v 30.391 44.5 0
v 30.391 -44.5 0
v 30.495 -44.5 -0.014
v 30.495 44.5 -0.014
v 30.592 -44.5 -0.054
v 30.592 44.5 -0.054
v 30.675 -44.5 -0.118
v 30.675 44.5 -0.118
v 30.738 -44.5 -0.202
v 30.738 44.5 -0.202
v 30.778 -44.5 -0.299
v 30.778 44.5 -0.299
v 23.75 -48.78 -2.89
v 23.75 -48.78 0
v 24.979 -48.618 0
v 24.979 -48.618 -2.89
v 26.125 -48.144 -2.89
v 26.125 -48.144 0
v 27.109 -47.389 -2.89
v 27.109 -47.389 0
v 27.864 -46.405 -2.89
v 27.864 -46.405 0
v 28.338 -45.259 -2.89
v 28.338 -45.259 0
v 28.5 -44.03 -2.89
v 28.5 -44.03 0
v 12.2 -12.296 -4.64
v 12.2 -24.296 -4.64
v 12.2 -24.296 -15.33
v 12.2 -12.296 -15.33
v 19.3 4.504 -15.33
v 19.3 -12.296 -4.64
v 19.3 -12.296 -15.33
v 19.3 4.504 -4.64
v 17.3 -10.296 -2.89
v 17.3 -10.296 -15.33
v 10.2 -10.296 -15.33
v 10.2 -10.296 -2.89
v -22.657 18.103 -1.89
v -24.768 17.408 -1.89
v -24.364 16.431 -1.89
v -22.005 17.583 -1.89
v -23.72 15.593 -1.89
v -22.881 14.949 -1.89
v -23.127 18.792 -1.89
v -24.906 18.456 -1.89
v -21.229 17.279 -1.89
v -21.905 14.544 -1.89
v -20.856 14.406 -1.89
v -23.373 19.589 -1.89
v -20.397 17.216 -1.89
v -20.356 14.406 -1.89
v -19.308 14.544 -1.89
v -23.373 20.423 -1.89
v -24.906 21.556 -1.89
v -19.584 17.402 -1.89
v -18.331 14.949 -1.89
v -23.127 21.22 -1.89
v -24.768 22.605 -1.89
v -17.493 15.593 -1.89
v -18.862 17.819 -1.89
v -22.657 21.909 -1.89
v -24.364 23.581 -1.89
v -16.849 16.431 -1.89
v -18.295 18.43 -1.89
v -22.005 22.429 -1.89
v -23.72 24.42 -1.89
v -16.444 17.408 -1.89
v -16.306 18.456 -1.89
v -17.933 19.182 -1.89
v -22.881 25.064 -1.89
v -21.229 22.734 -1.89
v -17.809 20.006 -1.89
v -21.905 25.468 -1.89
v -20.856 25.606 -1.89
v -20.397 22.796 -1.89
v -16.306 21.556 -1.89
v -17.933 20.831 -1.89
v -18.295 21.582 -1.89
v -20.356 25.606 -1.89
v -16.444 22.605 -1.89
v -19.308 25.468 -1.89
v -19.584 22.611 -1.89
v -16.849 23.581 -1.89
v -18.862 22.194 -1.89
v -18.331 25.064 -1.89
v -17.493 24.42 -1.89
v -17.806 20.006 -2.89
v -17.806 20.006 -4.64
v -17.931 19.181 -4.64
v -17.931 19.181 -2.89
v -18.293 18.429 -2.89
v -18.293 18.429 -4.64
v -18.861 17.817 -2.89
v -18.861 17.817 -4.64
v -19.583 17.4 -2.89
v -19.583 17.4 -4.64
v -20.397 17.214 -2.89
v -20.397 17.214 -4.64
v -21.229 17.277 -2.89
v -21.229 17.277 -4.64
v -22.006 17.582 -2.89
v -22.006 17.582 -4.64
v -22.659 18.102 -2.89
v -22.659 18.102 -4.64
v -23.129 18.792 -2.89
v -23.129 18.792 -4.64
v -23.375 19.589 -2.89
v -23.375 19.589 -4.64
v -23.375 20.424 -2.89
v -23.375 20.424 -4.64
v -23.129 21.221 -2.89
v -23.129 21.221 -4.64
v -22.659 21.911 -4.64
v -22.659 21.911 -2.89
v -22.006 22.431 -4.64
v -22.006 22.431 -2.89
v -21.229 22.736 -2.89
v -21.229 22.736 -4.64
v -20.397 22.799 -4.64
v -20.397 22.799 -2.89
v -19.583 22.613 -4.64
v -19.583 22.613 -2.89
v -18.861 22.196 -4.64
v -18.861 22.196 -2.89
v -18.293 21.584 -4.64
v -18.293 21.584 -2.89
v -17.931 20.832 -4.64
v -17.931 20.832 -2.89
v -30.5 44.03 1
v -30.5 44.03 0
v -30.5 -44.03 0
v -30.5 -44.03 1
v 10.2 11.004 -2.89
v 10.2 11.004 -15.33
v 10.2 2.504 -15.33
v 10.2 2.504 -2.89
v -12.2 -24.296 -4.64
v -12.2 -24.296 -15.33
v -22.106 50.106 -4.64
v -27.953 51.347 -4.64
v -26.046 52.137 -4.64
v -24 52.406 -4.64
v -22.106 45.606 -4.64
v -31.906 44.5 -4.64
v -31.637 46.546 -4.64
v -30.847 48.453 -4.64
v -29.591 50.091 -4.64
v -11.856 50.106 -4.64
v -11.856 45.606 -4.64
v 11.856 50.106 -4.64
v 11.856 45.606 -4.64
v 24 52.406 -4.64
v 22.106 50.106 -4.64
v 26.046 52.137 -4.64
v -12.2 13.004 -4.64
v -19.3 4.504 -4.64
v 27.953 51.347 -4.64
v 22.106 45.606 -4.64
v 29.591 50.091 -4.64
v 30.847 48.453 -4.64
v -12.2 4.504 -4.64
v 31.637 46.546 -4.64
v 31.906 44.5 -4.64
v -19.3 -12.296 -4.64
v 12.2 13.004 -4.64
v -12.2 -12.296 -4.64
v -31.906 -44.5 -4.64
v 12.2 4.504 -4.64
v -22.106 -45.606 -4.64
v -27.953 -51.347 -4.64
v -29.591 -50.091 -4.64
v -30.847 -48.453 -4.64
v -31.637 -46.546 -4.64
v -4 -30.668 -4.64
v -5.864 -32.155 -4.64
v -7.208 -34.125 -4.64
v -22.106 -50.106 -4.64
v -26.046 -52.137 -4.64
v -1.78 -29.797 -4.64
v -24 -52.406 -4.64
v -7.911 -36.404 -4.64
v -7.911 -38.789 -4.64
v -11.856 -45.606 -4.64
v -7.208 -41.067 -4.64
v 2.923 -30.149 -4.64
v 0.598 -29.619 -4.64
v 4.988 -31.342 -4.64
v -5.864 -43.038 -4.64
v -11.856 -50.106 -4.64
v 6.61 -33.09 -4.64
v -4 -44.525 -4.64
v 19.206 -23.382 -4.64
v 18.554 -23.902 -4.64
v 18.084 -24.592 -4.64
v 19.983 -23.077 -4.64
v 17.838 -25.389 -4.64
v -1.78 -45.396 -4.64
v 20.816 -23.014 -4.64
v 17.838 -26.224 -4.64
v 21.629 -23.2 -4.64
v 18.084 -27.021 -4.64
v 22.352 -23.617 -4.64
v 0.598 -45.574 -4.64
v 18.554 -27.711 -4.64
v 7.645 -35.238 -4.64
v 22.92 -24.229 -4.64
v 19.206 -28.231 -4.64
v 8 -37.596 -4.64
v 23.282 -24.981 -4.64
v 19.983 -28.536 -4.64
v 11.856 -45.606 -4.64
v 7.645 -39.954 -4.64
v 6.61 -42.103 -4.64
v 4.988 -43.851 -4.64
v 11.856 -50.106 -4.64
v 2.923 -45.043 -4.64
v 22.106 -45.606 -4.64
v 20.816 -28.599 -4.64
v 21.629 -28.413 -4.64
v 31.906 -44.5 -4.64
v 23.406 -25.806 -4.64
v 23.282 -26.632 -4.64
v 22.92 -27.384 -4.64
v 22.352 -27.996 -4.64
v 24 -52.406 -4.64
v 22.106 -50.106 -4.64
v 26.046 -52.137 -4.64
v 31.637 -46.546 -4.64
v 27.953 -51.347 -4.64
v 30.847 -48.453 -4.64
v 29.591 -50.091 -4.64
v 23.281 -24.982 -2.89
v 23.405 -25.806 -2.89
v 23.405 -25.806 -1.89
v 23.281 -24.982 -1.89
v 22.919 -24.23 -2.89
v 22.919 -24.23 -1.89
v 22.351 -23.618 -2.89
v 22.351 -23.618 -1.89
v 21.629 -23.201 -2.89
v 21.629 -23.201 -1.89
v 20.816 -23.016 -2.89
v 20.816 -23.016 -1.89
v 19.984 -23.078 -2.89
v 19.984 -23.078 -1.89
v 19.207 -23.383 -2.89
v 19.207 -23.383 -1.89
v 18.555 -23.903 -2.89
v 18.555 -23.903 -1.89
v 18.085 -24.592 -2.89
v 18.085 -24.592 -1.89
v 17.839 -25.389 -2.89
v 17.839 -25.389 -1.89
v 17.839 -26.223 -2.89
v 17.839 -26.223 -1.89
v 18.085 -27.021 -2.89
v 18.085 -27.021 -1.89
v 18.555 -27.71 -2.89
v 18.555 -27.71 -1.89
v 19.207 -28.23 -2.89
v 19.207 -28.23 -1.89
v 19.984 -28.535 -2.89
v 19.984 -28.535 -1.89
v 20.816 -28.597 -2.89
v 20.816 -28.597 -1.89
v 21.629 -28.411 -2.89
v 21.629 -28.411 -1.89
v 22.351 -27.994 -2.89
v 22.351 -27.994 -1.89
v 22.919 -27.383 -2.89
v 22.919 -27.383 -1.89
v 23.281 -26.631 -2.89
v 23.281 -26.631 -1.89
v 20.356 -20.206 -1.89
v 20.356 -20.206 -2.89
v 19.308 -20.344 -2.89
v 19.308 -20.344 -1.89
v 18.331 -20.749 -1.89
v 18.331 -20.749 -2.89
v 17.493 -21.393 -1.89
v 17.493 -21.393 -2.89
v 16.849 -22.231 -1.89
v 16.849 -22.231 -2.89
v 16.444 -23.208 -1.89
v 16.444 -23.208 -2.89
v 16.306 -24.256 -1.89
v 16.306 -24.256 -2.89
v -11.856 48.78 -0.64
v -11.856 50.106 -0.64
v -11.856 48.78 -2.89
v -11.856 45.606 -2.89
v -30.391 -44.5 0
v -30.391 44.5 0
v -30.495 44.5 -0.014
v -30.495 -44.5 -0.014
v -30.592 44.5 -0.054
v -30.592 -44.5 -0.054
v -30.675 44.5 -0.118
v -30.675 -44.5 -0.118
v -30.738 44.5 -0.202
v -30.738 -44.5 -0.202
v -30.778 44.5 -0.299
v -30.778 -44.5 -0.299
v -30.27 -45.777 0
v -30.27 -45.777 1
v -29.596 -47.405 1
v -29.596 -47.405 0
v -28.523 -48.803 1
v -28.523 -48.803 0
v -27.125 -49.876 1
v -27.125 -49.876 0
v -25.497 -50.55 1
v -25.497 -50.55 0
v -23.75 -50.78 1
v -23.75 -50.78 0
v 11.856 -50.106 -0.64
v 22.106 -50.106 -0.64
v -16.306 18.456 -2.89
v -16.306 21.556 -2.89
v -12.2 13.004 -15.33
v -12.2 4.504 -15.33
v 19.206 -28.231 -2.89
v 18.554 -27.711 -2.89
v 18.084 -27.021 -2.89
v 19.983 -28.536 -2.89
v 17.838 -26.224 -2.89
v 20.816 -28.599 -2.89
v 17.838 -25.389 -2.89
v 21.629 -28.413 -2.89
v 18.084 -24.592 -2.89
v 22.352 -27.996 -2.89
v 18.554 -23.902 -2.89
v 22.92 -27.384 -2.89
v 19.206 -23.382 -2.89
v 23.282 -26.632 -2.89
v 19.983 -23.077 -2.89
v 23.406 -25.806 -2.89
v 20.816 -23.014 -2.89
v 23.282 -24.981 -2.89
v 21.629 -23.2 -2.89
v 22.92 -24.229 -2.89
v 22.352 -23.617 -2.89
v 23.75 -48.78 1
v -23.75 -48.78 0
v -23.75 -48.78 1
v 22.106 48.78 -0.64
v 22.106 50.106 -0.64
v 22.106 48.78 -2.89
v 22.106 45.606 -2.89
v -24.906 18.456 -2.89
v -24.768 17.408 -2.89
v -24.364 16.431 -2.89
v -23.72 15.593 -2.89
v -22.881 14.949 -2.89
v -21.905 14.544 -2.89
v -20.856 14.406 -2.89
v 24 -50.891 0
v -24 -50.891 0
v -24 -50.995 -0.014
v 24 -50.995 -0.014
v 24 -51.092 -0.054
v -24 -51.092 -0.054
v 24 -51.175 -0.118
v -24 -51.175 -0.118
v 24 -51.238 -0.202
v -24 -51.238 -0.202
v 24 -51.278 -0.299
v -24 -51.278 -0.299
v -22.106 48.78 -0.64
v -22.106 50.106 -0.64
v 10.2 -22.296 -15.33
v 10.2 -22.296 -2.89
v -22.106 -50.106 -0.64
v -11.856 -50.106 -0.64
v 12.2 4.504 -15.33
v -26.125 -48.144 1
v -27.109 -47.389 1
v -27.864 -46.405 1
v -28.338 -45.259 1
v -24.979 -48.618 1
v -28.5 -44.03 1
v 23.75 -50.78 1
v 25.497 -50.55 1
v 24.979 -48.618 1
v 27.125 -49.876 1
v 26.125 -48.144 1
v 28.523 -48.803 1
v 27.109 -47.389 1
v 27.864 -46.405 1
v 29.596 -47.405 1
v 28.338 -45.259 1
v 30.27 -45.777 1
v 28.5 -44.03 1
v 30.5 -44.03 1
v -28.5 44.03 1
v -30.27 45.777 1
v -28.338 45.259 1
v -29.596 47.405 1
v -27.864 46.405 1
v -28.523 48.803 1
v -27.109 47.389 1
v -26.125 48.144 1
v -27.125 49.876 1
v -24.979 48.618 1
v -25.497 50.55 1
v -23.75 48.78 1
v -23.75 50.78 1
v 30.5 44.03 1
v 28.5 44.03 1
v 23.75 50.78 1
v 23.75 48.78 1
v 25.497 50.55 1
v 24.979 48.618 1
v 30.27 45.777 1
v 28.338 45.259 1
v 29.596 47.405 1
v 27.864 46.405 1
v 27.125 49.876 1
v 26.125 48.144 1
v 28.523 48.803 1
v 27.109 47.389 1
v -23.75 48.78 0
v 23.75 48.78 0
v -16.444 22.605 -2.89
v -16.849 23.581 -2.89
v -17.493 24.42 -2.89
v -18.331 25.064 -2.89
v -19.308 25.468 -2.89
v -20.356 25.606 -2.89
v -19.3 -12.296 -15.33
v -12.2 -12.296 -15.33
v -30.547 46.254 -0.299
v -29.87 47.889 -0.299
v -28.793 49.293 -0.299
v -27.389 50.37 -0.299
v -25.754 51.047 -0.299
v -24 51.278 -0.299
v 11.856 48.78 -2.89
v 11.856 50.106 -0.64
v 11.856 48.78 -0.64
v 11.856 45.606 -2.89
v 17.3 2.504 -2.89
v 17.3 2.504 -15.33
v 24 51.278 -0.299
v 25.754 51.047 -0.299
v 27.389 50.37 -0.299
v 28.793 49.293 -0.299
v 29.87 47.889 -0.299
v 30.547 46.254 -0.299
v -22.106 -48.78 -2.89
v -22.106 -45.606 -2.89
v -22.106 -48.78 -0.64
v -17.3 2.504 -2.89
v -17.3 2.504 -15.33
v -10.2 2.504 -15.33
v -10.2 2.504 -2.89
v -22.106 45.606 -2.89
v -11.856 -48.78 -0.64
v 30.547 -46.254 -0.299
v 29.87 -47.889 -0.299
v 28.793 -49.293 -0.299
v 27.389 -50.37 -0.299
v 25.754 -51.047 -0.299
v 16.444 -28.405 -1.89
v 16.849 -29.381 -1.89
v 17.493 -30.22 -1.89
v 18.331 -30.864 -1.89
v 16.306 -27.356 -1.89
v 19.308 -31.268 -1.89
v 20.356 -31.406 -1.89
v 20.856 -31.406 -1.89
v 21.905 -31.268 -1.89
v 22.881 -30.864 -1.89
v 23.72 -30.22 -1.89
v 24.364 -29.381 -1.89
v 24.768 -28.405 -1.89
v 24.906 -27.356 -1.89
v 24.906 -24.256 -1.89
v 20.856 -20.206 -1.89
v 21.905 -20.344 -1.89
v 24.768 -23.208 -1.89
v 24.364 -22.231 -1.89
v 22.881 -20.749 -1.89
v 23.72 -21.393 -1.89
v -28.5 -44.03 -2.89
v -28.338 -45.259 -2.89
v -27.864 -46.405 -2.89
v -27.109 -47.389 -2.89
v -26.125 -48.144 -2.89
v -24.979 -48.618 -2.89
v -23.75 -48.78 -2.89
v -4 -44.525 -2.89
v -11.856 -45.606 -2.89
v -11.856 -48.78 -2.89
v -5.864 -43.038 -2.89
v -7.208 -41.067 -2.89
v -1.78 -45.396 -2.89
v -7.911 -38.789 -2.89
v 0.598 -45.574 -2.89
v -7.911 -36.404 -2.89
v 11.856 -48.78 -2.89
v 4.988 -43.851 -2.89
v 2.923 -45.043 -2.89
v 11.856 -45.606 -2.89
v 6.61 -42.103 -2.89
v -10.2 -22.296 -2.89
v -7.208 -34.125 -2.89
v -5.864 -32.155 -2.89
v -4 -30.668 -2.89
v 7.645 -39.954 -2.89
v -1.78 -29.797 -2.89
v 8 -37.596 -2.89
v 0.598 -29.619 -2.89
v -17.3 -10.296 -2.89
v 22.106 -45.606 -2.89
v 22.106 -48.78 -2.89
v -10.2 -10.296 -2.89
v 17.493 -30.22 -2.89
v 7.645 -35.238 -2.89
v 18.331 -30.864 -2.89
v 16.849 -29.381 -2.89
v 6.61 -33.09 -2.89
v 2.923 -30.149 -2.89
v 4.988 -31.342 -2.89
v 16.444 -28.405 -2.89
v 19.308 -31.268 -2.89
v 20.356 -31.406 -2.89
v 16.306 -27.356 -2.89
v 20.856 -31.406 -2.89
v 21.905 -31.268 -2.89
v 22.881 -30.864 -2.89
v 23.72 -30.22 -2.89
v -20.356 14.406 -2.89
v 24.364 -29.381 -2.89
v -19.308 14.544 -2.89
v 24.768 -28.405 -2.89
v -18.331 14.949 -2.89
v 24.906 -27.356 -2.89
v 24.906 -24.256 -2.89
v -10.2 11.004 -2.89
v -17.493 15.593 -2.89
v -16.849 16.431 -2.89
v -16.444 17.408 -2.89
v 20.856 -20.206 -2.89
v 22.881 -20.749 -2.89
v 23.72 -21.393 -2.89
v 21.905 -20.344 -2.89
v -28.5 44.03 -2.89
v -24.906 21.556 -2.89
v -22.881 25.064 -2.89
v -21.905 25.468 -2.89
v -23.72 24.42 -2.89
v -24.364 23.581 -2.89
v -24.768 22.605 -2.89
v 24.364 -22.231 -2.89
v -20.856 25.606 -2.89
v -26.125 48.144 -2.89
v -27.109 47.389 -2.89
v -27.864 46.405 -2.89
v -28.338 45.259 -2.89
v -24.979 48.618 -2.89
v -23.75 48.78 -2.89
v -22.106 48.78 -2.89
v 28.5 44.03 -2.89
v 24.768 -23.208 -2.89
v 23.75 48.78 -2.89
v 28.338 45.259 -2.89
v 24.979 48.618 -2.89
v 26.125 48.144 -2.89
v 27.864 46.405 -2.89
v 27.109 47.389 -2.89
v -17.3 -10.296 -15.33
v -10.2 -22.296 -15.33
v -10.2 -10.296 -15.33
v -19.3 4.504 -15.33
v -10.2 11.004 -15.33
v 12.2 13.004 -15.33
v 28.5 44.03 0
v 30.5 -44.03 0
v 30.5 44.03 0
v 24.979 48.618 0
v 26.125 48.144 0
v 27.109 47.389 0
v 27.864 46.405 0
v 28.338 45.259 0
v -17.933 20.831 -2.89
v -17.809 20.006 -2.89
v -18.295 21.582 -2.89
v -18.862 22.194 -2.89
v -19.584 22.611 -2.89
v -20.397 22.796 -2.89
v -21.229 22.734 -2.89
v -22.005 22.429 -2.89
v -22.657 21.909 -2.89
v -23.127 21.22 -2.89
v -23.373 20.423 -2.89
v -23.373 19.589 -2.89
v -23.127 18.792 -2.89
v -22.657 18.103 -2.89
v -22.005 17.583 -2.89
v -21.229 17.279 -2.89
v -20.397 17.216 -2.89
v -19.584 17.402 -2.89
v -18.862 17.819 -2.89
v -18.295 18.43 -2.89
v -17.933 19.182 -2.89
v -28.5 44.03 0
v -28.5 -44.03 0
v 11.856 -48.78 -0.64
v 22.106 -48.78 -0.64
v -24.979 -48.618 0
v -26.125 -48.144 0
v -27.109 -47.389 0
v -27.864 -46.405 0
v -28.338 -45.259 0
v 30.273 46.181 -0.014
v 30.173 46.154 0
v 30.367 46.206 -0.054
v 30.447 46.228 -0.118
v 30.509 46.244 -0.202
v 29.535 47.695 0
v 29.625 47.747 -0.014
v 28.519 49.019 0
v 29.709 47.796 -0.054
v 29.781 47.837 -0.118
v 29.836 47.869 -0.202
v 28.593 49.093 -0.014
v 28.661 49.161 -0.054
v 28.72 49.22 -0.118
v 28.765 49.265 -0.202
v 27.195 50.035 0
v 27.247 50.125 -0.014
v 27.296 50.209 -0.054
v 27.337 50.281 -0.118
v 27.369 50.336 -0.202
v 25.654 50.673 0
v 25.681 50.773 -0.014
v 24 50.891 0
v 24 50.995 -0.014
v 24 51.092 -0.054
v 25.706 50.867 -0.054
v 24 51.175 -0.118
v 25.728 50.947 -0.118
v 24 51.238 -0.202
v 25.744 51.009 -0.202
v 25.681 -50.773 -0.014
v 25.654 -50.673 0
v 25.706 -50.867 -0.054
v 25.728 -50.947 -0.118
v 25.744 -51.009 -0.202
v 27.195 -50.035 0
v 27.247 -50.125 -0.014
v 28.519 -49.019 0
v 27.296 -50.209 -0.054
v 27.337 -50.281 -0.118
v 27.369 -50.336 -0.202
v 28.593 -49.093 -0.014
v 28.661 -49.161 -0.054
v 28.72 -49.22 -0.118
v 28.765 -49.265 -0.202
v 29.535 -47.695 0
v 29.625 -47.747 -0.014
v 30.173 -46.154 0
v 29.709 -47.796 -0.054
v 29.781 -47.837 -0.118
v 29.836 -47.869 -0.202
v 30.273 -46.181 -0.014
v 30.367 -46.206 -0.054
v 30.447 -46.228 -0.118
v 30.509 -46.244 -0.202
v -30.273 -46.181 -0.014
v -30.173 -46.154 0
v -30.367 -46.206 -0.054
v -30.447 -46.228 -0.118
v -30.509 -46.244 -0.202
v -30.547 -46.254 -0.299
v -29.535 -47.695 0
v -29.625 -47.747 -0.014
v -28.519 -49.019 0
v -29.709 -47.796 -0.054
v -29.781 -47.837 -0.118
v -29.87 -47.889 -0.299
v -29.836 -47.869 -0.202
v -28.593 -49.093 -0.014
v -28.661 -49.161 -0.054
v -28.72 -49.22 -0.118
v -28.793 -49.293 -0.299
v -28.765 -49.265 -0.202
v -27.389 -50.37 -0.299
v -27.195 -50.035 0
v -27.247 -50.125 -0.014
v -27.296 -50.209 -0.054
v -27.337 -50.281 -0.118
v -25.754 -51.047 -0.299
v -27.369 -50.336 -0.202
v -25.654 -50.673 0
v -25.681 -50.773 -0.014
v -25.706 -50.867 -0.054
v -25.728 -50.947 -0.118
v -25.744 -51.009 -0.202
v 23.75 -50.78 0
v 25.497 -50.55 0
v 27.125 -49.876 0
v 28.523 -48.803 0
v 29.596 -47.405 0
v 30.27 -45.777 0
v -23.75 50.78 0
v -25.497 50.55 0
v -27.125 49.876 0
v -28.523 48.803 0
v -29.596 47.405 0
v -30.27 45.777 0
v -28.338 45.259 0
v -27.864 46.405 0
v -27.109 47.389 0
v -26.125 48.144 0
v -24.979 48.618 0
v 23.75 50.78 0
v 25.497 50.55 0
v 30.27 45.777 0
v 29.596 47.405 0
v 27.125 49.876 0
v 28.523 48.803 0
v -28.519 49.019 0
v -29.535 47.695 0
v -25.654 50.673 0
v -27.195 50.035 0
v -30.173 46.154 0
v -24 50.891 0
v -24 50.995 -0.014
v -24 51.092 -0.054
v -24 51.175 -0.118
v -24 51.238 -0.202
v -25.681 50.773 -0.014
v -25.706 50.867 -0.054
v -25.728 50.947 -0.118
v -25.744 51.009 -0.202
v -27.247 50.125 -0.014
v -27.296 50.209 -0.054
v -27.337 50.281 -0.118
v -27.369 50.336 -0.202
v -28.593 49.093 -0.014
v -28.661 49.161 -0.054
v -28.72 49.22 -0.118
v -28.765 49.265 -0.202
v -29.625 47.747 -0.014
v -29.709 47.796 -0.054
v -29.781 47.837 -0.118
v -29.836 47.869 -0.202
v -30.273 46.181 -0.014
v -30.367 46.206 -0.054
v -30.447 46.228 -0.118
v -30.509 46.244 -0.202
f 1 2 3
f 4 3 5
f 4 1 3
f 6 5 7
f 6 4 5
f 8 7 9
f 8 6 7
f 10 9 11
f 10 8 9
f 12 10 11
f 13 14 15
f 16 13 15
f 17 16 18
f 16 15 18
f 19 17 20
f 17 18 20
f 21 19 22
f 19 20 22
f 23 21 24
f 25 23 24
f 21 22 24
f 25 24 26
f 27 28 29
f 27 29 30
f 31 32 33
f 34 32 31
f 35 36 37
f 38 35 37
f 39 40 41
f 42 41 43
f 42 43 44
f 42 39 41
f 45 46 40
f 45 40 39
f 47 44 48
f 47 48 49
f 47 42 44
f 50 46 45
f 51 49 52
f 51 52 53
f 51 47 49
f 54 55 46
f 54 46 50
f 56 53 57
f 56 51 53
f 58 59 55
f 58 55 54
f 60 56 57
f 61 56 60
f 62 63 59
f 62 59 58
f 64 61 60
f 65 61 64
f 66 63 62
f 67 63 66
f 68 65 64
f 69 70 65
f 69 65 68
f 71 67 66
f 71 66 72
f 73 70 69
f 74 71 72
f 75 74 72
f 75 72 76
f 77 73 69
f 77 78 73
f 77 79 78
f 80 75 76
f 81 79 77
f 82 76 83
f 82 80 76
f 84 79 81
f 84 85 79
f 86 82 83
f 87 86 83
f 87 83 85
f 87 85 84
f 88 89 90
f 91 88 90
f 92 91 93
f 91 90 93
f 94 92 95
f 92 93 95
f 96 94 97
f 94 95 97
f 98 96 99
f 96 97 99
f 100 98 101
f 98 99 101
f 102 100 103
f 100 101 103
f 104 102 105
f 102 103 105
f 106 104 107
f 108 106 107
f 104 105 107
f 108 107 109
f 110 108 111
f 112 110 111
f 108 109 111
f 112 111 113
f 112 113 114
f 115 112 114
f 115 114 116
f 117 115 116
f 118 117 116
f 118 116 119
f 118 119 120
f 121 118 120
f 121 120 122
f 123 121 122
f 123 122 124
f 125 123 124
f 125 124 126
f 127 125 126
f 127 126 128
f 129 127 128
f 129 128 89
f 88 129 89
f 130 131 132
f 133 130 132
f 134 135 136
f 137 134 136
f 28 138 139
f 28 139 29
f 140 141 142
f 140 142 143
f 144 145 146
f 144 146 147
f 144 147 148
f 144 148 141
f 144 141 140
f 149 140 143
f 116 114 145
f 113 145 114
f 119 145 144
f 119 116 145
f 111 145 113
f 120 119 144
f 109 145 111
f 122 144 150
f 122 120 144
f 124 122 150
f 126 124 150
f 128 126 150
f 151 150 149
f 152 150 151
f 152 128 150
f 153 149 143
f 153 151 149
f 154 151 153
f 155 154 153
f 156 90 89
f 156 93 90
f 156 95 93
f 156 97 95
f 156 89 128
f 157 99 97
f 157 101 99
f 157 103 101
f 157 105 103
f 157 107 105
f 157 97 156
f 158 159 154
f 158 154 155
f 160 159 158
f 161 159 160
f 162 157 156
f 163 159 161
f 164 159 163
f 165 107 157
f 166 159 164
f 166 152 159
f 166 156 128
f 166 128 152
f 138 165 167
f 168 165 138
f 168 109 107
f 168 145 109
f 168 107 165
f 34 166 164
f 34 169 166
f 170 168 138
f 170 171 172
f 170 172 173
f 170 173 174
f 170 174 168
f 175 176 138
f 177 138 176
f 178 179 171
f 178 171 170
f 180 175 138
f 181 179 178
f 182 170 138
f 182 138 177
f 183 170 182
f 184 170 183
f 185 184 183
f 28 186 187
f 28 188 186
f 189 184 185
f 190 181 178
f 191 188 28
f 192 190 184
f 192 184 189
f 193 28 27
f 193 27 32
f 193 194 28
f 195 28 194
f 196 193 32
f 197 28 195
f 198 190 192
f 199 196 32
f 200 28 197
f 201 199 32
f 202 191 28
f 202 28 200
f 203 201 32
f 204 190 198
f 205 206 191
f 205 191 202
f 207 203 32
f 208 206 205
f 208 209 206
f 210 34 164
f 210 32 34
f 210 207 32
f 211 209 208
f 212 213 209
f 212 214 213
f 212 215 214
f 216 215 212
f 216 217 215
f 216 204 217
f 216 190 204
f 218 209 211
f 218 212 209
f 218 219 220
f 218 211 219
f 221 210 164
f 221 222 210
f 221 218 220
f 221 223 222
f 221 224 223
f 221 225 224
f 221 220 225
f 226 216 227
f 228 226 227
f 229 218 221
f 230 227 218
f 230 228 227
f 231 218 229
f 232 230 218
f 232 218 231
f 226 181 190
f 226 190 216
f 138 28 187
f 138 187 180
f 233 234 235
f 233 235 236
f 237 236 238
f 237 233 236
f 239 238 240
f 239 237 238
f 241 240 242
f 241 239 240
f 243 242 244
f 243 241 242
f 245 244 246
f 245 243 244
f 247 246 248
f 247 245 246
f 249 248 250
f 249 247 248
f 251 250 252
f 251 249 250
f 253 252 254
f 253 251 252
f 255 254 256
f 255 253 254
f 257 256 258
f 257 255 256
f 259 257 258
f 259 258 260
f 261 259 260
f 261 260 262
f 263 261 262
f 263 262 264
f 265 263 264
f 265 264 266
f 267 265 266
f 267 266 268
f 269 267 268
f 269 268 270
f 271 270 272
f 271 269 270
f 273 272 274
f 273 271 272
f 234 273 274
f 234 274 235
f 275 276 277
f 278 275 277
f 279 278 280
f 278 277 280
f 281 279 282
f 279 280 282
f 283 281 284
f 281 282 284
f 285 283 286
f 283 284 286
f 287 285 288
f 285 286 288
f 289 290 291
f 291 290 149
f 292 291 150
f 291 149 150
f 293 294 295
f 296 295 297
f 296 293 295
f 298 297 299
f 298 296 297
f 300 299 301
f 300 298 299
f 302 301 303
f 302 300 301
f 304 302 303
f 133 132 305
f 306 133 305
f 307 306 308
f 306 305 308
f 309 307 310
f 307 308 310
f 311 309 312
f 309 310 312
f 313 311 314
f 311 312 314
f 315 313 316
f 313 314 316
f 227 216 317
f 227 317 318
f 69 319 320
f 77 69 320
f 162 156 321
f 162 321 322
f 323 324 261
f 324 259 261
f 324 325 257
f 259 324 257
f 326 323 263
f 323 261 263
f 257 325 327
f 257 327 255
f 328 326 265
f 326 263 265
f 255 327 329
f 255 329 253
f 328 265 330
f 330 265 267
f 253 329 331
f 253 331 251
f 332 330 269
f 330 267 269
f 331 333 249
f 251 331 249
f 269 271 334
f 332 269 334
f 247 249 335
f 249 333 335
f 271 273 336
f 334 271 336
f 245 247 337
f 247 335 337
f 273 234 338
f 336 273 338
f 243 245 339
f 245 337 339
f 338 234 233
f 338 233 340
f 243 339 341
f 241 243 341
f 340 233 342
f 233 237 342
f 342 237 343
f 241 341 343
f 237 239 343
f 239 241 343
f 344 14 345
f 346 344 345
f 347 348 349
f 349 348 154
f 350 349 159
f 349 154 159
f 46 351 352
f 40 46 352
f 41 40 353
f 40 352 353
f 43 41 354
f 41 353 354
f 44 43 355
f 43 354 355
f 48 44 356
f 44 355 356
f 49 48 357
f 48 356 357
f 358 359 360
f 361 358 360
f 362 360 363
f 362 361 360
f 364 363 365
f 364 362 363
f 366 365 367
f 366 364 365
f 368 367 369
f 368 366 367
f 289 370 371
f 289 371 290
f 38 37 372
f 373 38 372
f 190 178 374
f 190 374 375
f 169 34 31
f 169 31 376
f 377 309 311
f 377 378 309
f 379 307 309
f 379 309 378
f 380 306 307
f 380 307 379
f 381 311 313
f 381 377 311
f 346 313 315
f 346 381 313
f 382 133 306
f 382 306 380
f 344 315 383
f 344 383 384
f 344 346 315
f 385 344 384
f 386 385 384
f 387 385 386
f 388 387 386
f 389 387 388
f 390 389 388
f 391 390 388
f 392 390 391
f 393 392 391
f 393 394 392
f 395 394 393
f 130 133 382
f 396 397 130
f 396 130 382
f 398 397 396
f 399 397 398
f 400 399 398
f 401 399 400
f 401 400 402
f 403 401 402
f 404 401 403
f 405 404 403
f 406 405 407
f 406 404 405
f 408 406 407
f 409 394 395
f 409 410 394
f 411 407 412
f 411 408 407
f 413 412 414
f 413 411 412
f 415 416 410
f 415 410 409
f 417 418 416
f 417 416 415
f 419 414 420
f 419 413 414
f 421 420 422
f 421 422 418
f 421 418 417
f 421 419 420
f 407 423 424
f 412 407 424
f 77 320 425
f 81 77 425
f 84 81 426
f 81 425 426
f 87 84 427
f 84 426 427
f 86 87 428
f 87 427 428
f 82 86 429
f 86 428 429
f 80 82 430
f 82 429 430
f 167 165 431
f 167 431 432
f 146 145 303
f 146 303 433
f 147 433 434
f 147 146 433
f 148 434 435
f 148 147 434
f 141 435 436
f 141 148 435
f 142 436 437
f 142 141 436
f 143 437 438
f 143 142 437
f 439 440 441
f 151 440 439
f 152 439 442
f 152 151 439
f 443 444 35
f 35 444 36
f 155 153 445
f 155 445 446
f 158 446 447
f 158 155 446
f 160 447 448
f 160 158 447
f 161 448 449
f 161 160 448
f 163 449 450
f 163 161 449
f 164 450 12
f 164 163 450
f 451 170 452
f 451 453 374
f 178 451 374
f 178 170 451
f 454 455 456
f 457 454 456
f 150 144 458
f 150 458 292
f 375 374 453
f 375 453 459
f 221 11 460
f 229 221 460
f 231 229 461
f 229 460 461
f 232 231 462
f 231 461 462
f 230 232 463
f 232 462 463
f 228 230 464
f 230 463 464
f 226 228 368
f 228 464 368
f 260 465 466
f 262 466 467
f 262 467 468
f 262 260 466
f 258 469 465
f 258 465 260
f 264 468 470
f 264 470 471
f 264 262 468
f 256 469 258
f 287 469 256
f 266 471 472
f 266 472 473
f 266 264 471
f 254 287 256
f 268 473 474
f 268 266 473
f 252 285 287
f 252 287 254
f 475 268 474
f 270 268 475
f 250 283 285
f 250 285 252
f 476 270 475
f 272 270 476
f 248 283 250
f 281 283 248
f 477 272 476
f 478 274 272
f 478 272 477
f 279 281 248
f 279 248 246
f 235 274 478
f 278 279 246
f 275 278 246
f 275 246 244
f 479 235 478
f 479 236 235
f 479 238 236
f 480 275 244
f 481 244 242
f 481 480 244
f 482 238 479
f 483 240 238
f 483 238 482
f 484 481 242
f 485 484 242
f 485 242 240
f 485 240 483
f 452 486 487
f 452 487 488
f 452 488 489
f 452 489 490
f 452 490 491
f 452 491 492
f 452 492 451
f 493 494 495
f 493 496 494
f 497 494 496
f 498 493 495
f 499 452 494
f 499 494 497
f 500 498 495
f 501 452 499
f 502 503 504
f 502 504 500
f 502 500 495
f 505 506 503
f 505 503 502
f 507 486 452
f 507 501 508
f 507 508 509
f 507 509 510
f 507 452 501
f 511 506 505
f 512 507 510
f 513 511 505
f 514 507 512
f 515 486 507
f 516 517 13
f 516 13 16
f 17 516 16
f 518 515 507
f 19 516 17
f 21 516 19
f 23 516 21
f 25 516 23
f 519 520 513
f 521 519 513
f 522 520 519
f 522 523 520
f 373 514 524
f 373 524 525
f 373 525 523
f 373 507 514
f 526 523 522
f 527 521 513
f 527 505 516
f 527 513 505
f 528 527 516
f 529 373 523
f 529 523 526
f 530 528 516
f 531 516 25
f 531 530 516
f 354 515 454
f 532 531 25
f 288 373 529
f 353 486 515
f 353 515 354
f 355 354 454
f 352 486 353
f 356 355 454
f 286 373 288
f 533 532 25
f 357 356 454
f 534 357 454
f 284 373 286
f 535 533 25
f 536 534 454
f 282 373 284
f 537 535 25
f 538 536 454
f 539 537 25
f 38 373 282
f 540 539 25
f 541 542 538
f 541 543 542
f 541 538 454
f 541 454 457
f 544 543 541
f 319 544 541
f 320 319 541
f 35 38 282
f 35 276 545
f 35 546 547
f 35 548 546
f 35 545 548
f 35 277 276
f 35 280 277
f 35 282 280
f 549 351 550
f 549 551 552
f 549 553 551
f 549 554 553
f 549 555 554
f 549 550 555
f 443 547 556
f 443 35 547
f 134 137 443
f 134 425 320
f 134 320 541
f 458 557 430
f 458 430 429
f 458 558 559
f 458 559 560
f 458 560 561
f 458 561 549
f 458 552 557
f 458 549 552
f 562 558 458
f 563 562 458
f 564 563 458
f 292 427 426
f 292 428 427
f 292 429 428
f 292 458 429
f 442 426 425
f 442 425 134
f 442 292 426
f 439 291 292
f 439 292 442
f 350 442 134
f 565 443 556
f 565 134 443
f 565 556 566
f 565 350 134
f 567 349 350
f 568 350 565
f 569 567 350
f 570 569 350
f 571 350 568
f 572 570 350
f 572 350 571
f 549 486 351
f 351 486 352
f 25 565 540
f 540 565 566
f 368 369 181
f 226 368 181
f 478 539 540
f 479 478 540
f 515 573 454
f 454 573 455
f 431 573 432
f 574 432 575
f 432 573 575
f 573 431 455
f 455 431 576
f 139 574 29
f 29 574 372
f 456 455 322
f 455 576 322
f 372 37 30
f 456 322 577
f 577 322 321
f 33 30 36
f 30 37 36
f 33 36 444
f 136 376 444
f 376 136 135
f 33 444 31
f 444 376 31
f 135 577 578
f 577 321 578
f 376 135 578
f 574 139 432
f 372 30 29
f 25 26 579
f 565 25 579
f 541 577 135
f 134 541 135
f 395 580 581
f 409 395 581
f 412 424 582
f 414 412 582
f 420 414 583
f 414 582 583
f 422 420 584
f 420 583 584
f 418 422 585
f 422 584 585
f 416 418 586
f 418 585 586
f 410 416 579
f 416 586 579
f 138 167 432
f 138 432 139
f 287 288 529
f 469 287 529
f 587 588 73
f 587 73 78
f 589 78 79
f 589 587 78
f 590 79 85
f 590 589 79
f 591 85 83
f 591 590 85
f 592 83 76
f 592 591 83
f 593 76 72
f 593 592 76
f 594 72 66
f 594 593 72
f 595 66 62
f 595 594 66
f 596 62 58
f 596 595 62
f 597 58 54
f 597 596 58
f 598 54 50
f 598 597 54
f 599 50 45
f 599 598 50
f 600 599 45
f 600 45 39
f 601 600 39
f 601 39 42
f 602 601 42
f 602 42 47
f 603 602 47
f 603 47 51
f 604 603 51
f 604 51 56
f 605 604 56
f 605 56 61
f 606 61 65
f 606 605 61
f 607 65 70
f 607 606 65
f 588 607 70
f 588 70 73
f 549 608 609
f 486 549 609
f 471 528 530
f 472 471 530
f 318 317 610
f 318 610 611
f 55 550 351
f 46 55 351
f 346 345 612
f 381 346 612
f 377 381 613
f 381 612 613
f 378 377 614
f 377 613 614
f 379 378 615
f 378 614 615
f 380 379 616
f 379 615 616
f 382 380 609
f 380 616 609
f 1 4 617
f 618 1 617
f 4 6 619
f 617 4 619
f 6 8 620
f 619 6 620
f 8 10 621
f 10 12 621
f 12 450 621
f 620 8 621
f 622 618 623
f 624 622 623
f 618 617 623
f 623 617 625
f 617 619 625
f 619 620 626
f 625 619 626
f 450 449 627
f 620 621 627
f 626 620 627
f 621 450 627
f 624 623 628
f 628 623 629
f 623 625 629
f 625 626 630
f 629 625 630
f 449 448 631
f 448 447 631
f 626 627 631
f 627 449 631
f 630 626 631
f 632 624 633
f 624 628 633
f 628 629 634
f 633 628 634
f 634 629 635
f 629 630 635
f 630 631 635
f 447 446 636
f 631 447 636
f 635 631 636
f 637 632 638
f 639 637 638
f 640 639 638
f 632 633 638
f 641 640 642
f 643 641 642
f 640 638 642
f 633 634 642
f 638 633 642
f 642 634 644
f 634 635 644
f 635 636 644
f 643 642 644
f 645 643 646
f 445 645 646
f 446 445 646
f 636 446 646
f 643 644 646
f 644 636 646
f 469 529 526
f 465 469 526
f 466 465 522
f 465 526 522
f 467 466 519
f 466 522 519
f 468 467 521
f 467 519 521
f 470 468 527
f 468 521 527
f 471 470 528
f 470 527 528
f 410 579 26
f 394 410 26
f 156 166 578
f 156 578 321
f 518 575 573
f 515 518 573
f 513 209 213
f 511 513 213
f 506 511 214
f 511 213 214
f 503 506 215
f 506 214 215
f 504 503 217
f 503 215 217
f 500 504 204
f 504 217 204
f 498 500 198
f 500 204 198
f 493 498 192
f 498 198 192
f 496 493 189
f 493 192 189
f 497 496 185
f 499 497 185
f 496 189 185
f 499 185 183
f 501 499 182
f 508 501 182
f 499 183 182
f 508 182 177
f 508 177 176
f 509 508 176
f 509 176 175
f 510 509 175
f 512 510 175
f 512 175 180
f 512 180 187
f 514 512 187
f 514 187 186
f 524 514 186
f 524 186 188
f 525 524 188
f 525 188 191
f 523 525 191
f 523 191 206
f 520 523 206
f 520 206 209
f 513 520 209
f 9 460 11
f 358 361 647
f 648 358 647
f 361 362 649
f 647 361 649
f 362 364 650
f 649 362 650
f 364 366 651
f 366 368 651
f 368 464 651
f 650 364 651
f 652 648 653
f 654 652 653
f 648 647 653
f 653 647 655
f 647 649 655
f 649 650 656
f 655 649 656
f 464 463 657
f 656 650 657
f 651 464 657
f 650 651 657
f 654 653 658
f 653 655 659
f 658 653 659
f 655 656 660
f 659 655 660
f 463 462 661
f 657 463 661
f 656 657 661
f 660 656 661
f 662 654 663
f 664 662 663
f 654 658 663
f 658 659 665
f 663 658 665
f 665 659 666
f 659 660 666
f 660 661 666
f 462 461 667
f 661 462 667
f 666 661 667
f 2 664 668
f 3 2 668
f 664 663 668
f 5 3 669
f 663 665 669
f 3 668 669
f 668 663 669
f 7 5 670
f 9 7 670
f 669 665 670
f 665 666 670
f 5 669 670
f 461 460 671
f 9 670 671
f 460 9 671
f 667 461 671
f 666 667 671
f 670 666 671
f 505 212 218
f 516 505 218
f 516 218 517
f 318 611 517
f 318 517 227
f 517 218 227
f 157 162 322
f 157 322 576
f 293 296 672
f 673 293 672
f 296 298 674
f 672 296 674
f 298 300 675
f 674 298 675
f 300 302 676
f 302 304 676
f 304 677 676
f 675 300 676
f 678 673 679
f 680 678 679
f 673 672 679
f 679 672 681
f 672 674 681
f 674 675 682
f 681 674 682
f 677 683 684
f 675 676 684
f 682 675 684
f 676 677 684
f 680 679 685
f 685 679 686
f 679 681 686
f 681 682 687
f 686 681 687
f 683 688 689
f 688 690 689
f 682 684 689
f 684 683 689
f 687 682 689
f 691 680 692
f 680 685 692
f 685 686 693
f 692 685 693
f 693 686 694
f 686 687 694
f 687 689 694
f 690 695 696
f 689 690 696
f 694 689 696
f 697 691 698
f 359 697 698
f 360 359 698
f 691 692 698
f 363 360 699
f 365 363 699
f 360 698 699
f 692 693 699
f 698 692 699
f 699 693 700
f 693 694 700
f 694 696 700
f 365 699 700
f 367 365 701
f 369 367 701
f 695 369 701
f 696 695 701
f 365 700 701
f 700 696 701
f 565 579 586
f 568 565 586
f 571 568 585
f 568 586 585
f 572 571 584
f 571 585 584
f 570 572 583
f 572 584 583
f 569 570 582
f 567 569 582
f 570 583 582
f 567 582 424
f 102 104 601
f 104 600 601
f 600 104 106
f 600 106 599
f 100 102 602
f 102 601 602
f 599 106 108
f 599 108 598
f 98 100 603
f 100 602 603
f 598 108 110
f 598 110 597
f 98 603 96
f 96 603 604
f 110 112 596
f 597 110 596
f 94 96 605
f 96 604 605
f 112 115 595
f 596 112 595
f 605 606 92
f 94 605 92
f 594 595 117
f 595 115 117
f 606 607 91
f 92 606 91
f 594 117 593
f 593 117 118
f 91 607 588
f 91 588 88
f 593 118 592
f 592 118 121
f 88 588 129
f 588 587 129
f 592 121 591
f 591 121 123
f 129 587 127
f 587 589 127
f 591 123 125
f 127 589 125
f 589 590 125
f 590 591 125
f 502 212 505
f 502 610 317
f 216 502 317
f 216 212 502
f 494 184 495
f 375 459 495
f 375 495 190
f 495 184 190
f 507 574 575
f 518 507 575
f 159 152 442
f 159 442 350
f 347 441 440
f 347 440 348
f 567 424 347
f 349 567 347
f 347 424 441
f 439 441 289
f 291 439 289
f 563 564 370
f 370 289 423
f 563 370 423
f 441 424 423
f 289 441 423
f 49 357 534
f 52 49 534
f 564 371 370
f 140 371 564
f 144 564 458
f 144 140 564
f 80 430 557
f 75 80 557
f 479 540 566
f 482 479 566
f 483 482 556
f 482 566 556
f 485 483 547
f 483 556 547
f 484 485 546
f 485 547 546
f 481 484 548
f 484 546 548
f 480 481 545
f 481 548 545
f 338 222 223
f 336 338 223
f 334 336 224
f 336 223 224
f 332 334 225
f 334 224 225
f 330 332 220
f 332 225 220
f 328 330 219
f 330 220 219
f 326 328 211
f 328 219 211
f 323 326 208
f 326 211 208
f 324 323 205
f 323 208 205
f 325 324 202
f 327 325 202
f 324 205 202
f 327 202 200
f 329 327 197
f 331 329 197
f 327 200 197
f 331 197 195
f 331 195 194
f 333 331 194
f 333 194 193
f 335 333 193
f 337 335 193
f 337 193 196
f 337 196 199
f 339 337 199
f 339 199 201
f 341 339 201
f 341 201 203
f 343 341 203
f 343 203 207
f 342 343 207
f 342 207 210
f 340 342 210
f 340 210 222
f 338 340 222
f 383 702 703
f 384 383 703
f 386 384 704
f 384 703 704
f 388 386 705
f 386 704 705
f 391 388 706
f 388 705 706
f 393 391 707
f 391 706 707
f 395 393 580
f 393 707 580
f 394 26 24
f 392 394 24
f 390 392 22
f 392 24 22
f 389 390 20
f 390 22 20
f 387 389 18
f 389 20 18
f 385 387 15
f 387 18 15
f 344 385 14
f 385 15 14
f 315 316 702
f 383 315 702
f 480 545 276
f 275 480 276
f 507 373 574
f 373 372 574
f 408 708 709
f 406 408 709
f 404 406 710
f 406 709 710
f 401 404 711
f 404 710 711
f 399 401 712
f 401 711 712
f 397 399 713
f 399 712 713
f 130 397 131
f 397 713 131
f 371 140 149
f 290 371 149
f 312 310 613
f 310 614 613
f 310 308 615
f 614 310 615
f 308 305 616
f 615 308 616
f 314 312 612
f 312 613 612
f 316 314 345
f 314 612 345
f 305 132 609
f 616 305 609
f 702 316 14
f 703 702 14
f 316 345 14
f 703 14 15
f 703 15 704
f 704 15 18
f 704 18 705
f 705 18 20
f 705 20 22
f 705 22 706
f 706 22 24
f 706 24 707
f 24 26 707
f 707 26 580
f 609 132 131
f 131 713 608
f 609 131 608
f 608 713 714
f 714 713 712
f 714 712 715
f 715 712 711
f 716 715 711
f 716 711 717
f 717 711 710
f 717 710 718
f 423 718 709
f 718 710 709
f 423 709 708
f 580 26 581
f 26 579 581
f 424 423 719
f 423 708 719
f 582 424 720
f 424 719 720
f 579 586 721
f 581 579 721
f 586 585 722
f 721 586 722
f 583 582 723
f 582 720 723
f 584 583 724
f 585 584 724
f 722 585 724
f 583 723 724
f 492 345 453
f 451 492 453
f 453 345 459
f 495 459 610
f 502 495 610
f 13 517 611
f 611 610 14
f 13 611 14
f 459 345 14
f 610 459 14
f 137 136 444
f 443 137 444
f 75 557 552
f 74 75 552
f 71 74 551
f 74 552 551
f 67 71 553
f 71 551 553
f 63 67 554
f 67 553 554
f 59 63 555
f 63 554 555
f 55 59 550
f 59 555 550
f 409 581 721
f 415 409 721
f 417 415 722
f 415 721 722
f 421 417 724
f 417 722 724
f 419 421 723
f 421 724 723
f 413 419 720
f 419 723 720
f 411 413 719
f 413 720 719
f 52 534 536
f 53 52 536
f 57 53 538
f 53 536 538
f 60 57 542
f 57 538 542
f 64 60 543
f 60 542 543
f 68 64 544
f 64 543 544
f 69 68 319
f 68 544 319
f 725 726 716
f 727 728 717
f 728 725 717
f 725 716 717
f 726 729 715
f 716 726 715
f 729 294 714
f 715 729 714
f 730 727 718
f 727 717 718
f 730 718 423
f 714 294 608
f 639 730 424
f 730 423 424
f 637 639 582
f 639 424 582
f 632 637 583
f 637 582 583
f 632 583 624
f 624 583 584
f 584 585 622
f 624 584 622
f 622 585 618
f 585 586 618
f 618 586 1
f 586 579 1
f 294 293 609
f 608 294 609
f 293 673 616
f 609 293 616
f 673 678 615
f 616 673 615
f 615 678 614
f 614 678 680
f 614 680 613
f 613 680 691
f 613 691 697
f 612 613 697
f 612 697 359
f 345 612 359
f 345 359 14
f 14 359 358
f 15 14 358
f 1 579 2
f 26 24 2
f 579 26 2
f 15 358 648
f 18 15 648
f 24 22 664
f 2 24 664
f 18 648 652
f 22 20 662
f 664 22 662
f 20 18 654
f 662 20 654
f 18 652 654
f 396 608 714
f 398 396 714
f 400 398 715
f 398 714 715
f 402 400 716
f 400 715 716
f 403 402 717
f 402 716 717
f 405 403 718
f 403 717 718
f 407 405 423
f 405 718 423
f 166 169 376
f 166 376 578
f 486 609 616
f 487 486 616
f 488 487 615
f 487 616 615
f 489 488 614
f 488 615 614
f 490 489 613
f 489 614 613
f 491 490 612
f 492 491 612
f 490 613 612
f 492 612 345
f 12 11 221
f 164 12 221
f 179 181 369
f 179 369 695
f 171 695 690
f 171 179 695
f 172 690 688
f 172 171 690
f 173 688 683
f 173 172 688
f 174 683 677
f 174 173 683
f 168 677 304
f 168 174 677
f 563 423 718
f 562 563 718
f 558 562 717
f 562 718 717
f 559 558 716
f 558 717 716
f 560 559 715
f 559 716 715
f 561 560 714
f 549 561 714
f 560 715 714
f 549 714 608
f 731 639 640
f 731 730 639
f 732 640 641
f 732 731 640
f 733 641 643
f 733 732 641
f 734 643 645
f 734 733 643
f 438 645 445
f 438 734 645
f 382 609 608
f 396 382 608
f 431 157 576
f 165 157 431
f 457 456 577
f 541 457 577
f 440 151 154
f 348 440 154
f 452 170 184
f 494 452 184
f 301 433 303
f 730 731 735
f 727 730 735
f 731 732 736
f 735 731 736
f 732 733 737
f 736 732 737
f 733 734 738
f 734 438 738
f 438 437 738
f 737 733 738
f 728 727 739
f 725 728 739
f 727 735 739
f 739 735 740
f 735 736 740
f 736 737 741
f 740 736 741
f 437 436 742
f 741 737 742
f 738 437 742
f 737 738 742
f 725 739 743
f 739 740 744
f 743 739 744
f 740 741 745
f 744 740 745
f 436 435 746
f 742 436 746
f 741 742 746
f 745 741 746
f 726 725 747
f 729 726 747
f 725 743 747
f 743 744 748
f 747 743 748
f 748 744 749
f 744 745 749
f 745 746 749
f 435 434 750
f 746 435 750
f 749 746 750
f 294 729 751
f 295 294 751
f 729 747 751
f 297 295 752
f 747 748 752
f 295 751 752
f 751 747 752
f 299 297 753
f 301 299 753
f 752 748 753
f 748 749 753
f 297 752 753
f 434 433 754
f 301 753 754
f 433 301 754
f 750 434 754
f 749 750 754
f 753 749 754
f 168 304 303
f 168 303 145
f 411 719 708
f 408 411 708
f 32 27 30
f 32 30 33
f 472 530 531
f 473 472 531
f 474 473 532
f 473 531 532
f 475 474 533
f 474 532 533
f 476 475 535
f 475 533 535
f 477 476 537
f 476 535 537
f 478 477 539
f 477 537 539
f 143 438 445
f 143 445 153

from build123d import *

# Parameters (mm, degrees)
F1_DEPTH     = 1
F4_DEPTH     = 4.64
F5_T1_DEPTH  = 48
F5_T3_DEPTH  = 89
F5_T6_ANGLE  = 90
F5_T8_ANGLE  = 90
F5_T10_ANGLE = 90
F5_T12_ANGLE = 90
F7_DEPTH     = 2.89
F8_R         = 0.4
F9_W         = 10.25
F9_H         = 4.5
F9_R         = 8
F9_R_2       = 2.8
F10_DEPTH    = 4
F11_R        = 2.7984324094
F11_R_2      = 2.7977753944
F12_DEPTH    = 1
F14_DEPTH    = 12.44
F16_DEPTH    = 1.75


# Not quite as in the source:
# - a fillet or chamfer that OpenCascade refuses, or shapes differently, is made with other operations: its cross-section is extruded or revolved along the edge and cut away or added


with BuildPart() as f1:
    # F0 (on Top) → F1 (new body)
    with BuildSketch(Plane.XY):
        with BuildLine():
            Line((23.75, 50.78), (0, 50.78))
            Line((0, 50.78), (-23.75, 50.78))
            ThreePointArc((-23.75, 50.78), (-28.522970773, 48.802970773), (-30.5, 44.03))
            Line((-30.5, 44.03), (-30.5, -44.03))
            ThreePointArc((-30.5, -44.03), (-28.522970773, -48.802970773), (-23.75, -50.78))
            Line((-23.75, -50.78), (0, -50.78))
            Line((0, -50.78), (23.75, -50.78))
            ThreePointArc((23.75, -50.78), (28.522970773, -48.802970773), (30.5, -44.03))
            Line((30.5, -44.03), (30.5, 44.03))
            ThreePointArc((30.5, 44.03), (28.522970773, 48.802970773), (23.75, 50.78))
        make_face()
        with BuildLine():
            Line((-23.75, 48.78), (0, 48.78))
            Line((0, 48.78), (23.75, 48.78))
            ThreePointArc((23.75, 48.78), (27.1087572106, 47.3887572106), (28.5, 44.03))
            Line((28.5, 44.03), (28.5, -44.03))
            ThreePointArc((28.5, -44.03), (27.1087572106, -47.3887572106), (23.75, -48.78))
            Line((23.75, -48.78), (0, -48.78))
            Line((0, -48.78), (-23.75, -48.78))
            ThreePointArc((-23.75, -48.78), (-27.1087572106, -47.3887572106), (-28.5, -44.03))
            Line((-28.5, -44.03), (-28.5, 44.03))
            ThreePointArc((-28.5, 44.03), (-27.1087572106, 47.3887572106), (-23.75, 48.78))
        make_face(mode=Mode.SUBTRACT)
    extrude(amount=F1_DEPTH)


with BuildPart() as f4:
    # F3 (on offset) → F4 (new body, through all)
    with BuildSketch(Plane(origin=(0, 0, -4.64), x_dir=(1, 0, 0), z_dir=(0, 0, -1))):
        with BuildLine():
            Line((24, 52.5), (0, 52.5))
            Line((0, 52.5), (-24, 52.5))
            ThreePointArc((-24, 52.5), (-29.6568542495, 50.1568542495), (-32, 44.5))
            Line((-32, 44.5), (-32, 0))
            Line((-32, 0), (-32, -44.5))
            ThreePointArc((-32, -44.5), (-29.6568542495, -50.1568542495), (-24, -52.5))
            Line((-24, -52.5), (0, -52.5))
            Line((0, -52.5), (24, -52.5))
            ThreePointArc((24, -52.5), (29.6568542495, -50.1568542495), (32, -44.5))
            Line((32, -44.5), (32, 0))
            Line((32, 0), (32, 44.5))
            ThreePointArc((32, 44.5), (29.6568542495, 50.1568542495), (24, 52.5))
        make_face()
    extrude(amount=-F4_DEPTH)

    # F5: chamfer of 1.3 x 5 on 8 edges, made by hand

    # F5_s2 → F5_t1 (cut)
    with BuildSketch(Plane.YZ.offset(-24)):
        Polygon((51.2, 0), (52.5, -5), (52.5, 0), align=None)
        Polygon((-51.2, 0), (-52.5, -5), (-52.5, 0), align=None)
    extrude(amount=F5_T1_DEPTH, mode=Mode.SUBTRACT)

    # F5_s4 → F5_t3 (cut)
    with BuildSketch(Plane.XZ.offset(-44.5)):
        Polygon((-30.7, 0), (-32, -5), (-32, 0), align=None)
        Polygon((30.7, 0), (32, -5), (32, 0), align=None)
    extrude(amount=F5_T3_DEPTH, mode=Mode.SUBTRACT)

    # F5_s5 → F5_t6 (revolve, cut)
    with BuildSketch(Plane.XZ.offset(44.5)):
        Polygon((32, -5), (30.7, 0), (32, 0), align=None)
    revolve(axis=Axis((24, -44.5, 0), (0, 0, -1)), revolution_arc=F5_T6_ANGLE, mode=Mode.SUBTRACT)

    # F5_s7 → F5_t8 (revolve, cut)
    with BuildSketch(Plane.YZ.offset(-24)):
        Polygon((-51.2, 0), (-52.5, -5), (-52.5, 0), align=None)
    revolve(axis=Axis((-24, -44.5, 0), (0, 0, -1)), revolution_arc=F5_T8_ANGLE, mode=Mode.SUBTRACT)

    # F5_s9 → F5_t10 (revolve, cut)
    with BuildSketch(Plane.XZ.offset(-44.5)):
        Polygon((-30.7, 0), (-32, -5), (-32, 0), align=None)
    revolve(axis=Axis((-24, 44.5, 0), (0, 0, -1)), revolution_arc=F5_T10_ANGLE, mode=Mode.SUBTRACT)

    # F5_s11 → F5_t12 (revolve, cut)
    with BuildSketch(Plane.YZ.offset(24)):
        Polygon((51.2, 0), (52.5, -5), (52.5, 0), align=None)
    revolve(axis=Axis((24, 44.5, 0), (0, 0, -1)), revolution_arc=F5_T12_ANGLE, mode=Mode.SUBTRACT)

    # F6 (on Top) → F7 (cut)
    with BuildSketch(Plane.XY):
        with BuildLine():
            Line((23.75, 48.78), (0, 48.78))
            Line((0, 48.78), (-23.75, 48.78))
            ThreePointArc((-23.75, 48.78), (-27.1087572106, 47.3887572106), (-28.5, 44.03))
            Line((-28.5, 44.03), (-28.5, -44.03))
            ThreePointArc((-28.5, -44.03), (-27.1087572106, -47.3887572106), (-23.75, -48.78))
            Line((-23.75, -48.78), (0, -48.78))
            Line((0, -48.78), (23.75, -48.78))
            ThreePointArc((23.75, -48.78), (27.1087572106, -47.3887572106), (28.5, -44.03))
            Line((28.5, -44.03), (28.5, 44.03))
            ThreePointArc((28.5, 44.03), (27.1087572106, 47.3887572106), (23.75, 48.78))
        make_face()
    extrude(amount=-F7_DEPTH, mode=Mode.SUBTRACT)

    # F8
    f8_edges = [f4.edges().sort_by_distance(p)[0] for p in [
        (0, -51.2, 0),
        (30.7, 0, 0),
        (28.737615, 49.237615, 0),
        (28.737615, -49.237615, 0),
        (0, 51.2, 0),
        (-28.737615, 49.237615, 0),
        (-30.7, 0, 0),
        (-28.737615, -49.237615, 0),
    ]]
    fillet(f8_edges, radius=F8_R)

    # F9 (on face) → F10 (cut)
    with BuildSketch(Plane(origin=(0, 0, -4.64), x_dir=(1, 0, 0), z_dir=(0, 0, -1))):
        with Locations((-16.9814, 47.8564)):
            Rectangle(F9_W, F9_H)
        with Locations((16.9814, 47.8564)):
            Rectangle(F9_W, F9_H)
        with Locations((-16.9814, -47.8564)):
            Rectangle(F9_W, F9_H)
        with Locations((16.9814, -47.8564)):
            Rectangle(F9_W, F9_H)
        with Locations((0, 37.5964)):
            Circle(F9_R)
        with Locations((20.6064, 25.8064)):
            Circle(F9_R_2)
        with Locations((-20.6064, -20.0064)):
            Circle(F9_R_2)
    extrude(amount=-F10_DEPTH, mode=Mode.SUBTRACT)

    # F11 (on face) → F12 (join)
    with BuildSketch(Plane.XY.offset(-2.89)):
        with BuildLine():
            Line((20.8564, -20.2064), (20.3564, -20.2064))
            ThreePointArc((20.3564, -20.2064), (17.4926175362, -21.3926175362), (16.3064, -24.2564))
            Line((16.3064, -24.2564), (16.3064, -27.3564))
            ThreePointArc((16.3064, -27.3564), (17.4926175362, -30.2201824638), (20.3564, -31.4064))
            Line((20.3564, -31.4064), (20.8564, -31.4064))
            ThreePointArc((20.8564, -31.4064), (23.7201824638, -30.2201824638), (24.9064, -27.3564))
            Line((24.9064, -27.3564), (24.9064, -24.2564))
            ThreePointArc((24.9064, -24.2564), (23.7201824638, -21.3926175362), (20.8564, -20.2064))
        make_face()
        with Locations((20.6064, -25.8064)):
            Circle(F11_R, mode=Mode.SUBTRACT)
        with BuildLine():
            Line((-20.3564, 25.6064), (-20.8564, 25.6064))
            ThreePointArc((-20.8564, 25.6064), (-23.7201824638, 24.4201824638), (-24.9064, 21.5564))
            Line((-24.9064, 21.5564), (-24.9064, 18.4564))
            ThreePointArc((-24.9064, 18.4564), (-23.7201824638, 15.5926175362), (-20.8564, 14.4064))
            Line((-20.8564, 14.4064), (-20.3564, 14.4064))
            ThreePointArc((-20.3564, 14.4064), (-17.4926175362, 15.5926175362), (-16.3064, 18.4564))
            Line((-16.3064, 18.4564), (-16.3064, 21.5564))
            ThreePointArc((-16.3064, 21.5564), (-17.4926175362, 24.4201824638), (-20.3564, 25.6064))
        make_face()
        with Locations((-20.6064, 20.0064)):
            Circle(F11_R_2, mode=Mode.SUBTRACT)
    extrude(amount=F12_DEPTH)

    # F13 (on face) → F14 (join)
    with BuildSketch(Plane.XY.offset(-2.89)):
        Polygon((12.2, 13.0036), (0, 13.0036), (-12.2, 13.0036), (-12.2, 4.5036), (-19.3, 4.5036), (-19.3, -12.2964), (-12.2, -12.2964), (-12.2, -24.2964), (0, -24.2964), (12.2, -24.2964), (12.2, -12.2964), (19.3, -12.2964), (19.3, 4.5036), (12.2, 4.5036), align=None)
        Polygon((10.2, -22.2964), (0, -22.2964), (-10.2, -22.2964), (-10.2, -10.2964), (-17.3, -10.2964), (-17.3, 2.5036), (-10.2, 2.5036), (-10.2, 11.0036), (0, 11.0036), (10.2, 11.0036), (10.2, 2.5036), (17.3, 2.5036), (17.3, -10.2964), (10.2, -10.2964), align=None, mode=Mode.SUBTRACT)
    extrude(amount=-F14_DEPTH)

    # F15 (on face) → F16 (cut, through all)
    with BuildSketch(Plane(origin=(0, 0, -4.64), x_dir=(1, 0, 0), z_dir=(0, 0, -1))):
        Polygon((10.2, 22.2964), (-10.2, 22.2964), (-10.2, 10.2964), (-17.3, 10.2964), (-17.3, -2.5036), (-10.2, -2.5036), (-10.2, -11.0036), (10.2, -11.0036), (10.2, -2.5036), (17.3, -2.5036), (17.3, 10.2964), (10.2, 10.2964), align=None)
    extrude(amount=-F16_DEPTH, mode=Mode.SUBTRACT)


solid = Compound([f1.part, f4.part])
